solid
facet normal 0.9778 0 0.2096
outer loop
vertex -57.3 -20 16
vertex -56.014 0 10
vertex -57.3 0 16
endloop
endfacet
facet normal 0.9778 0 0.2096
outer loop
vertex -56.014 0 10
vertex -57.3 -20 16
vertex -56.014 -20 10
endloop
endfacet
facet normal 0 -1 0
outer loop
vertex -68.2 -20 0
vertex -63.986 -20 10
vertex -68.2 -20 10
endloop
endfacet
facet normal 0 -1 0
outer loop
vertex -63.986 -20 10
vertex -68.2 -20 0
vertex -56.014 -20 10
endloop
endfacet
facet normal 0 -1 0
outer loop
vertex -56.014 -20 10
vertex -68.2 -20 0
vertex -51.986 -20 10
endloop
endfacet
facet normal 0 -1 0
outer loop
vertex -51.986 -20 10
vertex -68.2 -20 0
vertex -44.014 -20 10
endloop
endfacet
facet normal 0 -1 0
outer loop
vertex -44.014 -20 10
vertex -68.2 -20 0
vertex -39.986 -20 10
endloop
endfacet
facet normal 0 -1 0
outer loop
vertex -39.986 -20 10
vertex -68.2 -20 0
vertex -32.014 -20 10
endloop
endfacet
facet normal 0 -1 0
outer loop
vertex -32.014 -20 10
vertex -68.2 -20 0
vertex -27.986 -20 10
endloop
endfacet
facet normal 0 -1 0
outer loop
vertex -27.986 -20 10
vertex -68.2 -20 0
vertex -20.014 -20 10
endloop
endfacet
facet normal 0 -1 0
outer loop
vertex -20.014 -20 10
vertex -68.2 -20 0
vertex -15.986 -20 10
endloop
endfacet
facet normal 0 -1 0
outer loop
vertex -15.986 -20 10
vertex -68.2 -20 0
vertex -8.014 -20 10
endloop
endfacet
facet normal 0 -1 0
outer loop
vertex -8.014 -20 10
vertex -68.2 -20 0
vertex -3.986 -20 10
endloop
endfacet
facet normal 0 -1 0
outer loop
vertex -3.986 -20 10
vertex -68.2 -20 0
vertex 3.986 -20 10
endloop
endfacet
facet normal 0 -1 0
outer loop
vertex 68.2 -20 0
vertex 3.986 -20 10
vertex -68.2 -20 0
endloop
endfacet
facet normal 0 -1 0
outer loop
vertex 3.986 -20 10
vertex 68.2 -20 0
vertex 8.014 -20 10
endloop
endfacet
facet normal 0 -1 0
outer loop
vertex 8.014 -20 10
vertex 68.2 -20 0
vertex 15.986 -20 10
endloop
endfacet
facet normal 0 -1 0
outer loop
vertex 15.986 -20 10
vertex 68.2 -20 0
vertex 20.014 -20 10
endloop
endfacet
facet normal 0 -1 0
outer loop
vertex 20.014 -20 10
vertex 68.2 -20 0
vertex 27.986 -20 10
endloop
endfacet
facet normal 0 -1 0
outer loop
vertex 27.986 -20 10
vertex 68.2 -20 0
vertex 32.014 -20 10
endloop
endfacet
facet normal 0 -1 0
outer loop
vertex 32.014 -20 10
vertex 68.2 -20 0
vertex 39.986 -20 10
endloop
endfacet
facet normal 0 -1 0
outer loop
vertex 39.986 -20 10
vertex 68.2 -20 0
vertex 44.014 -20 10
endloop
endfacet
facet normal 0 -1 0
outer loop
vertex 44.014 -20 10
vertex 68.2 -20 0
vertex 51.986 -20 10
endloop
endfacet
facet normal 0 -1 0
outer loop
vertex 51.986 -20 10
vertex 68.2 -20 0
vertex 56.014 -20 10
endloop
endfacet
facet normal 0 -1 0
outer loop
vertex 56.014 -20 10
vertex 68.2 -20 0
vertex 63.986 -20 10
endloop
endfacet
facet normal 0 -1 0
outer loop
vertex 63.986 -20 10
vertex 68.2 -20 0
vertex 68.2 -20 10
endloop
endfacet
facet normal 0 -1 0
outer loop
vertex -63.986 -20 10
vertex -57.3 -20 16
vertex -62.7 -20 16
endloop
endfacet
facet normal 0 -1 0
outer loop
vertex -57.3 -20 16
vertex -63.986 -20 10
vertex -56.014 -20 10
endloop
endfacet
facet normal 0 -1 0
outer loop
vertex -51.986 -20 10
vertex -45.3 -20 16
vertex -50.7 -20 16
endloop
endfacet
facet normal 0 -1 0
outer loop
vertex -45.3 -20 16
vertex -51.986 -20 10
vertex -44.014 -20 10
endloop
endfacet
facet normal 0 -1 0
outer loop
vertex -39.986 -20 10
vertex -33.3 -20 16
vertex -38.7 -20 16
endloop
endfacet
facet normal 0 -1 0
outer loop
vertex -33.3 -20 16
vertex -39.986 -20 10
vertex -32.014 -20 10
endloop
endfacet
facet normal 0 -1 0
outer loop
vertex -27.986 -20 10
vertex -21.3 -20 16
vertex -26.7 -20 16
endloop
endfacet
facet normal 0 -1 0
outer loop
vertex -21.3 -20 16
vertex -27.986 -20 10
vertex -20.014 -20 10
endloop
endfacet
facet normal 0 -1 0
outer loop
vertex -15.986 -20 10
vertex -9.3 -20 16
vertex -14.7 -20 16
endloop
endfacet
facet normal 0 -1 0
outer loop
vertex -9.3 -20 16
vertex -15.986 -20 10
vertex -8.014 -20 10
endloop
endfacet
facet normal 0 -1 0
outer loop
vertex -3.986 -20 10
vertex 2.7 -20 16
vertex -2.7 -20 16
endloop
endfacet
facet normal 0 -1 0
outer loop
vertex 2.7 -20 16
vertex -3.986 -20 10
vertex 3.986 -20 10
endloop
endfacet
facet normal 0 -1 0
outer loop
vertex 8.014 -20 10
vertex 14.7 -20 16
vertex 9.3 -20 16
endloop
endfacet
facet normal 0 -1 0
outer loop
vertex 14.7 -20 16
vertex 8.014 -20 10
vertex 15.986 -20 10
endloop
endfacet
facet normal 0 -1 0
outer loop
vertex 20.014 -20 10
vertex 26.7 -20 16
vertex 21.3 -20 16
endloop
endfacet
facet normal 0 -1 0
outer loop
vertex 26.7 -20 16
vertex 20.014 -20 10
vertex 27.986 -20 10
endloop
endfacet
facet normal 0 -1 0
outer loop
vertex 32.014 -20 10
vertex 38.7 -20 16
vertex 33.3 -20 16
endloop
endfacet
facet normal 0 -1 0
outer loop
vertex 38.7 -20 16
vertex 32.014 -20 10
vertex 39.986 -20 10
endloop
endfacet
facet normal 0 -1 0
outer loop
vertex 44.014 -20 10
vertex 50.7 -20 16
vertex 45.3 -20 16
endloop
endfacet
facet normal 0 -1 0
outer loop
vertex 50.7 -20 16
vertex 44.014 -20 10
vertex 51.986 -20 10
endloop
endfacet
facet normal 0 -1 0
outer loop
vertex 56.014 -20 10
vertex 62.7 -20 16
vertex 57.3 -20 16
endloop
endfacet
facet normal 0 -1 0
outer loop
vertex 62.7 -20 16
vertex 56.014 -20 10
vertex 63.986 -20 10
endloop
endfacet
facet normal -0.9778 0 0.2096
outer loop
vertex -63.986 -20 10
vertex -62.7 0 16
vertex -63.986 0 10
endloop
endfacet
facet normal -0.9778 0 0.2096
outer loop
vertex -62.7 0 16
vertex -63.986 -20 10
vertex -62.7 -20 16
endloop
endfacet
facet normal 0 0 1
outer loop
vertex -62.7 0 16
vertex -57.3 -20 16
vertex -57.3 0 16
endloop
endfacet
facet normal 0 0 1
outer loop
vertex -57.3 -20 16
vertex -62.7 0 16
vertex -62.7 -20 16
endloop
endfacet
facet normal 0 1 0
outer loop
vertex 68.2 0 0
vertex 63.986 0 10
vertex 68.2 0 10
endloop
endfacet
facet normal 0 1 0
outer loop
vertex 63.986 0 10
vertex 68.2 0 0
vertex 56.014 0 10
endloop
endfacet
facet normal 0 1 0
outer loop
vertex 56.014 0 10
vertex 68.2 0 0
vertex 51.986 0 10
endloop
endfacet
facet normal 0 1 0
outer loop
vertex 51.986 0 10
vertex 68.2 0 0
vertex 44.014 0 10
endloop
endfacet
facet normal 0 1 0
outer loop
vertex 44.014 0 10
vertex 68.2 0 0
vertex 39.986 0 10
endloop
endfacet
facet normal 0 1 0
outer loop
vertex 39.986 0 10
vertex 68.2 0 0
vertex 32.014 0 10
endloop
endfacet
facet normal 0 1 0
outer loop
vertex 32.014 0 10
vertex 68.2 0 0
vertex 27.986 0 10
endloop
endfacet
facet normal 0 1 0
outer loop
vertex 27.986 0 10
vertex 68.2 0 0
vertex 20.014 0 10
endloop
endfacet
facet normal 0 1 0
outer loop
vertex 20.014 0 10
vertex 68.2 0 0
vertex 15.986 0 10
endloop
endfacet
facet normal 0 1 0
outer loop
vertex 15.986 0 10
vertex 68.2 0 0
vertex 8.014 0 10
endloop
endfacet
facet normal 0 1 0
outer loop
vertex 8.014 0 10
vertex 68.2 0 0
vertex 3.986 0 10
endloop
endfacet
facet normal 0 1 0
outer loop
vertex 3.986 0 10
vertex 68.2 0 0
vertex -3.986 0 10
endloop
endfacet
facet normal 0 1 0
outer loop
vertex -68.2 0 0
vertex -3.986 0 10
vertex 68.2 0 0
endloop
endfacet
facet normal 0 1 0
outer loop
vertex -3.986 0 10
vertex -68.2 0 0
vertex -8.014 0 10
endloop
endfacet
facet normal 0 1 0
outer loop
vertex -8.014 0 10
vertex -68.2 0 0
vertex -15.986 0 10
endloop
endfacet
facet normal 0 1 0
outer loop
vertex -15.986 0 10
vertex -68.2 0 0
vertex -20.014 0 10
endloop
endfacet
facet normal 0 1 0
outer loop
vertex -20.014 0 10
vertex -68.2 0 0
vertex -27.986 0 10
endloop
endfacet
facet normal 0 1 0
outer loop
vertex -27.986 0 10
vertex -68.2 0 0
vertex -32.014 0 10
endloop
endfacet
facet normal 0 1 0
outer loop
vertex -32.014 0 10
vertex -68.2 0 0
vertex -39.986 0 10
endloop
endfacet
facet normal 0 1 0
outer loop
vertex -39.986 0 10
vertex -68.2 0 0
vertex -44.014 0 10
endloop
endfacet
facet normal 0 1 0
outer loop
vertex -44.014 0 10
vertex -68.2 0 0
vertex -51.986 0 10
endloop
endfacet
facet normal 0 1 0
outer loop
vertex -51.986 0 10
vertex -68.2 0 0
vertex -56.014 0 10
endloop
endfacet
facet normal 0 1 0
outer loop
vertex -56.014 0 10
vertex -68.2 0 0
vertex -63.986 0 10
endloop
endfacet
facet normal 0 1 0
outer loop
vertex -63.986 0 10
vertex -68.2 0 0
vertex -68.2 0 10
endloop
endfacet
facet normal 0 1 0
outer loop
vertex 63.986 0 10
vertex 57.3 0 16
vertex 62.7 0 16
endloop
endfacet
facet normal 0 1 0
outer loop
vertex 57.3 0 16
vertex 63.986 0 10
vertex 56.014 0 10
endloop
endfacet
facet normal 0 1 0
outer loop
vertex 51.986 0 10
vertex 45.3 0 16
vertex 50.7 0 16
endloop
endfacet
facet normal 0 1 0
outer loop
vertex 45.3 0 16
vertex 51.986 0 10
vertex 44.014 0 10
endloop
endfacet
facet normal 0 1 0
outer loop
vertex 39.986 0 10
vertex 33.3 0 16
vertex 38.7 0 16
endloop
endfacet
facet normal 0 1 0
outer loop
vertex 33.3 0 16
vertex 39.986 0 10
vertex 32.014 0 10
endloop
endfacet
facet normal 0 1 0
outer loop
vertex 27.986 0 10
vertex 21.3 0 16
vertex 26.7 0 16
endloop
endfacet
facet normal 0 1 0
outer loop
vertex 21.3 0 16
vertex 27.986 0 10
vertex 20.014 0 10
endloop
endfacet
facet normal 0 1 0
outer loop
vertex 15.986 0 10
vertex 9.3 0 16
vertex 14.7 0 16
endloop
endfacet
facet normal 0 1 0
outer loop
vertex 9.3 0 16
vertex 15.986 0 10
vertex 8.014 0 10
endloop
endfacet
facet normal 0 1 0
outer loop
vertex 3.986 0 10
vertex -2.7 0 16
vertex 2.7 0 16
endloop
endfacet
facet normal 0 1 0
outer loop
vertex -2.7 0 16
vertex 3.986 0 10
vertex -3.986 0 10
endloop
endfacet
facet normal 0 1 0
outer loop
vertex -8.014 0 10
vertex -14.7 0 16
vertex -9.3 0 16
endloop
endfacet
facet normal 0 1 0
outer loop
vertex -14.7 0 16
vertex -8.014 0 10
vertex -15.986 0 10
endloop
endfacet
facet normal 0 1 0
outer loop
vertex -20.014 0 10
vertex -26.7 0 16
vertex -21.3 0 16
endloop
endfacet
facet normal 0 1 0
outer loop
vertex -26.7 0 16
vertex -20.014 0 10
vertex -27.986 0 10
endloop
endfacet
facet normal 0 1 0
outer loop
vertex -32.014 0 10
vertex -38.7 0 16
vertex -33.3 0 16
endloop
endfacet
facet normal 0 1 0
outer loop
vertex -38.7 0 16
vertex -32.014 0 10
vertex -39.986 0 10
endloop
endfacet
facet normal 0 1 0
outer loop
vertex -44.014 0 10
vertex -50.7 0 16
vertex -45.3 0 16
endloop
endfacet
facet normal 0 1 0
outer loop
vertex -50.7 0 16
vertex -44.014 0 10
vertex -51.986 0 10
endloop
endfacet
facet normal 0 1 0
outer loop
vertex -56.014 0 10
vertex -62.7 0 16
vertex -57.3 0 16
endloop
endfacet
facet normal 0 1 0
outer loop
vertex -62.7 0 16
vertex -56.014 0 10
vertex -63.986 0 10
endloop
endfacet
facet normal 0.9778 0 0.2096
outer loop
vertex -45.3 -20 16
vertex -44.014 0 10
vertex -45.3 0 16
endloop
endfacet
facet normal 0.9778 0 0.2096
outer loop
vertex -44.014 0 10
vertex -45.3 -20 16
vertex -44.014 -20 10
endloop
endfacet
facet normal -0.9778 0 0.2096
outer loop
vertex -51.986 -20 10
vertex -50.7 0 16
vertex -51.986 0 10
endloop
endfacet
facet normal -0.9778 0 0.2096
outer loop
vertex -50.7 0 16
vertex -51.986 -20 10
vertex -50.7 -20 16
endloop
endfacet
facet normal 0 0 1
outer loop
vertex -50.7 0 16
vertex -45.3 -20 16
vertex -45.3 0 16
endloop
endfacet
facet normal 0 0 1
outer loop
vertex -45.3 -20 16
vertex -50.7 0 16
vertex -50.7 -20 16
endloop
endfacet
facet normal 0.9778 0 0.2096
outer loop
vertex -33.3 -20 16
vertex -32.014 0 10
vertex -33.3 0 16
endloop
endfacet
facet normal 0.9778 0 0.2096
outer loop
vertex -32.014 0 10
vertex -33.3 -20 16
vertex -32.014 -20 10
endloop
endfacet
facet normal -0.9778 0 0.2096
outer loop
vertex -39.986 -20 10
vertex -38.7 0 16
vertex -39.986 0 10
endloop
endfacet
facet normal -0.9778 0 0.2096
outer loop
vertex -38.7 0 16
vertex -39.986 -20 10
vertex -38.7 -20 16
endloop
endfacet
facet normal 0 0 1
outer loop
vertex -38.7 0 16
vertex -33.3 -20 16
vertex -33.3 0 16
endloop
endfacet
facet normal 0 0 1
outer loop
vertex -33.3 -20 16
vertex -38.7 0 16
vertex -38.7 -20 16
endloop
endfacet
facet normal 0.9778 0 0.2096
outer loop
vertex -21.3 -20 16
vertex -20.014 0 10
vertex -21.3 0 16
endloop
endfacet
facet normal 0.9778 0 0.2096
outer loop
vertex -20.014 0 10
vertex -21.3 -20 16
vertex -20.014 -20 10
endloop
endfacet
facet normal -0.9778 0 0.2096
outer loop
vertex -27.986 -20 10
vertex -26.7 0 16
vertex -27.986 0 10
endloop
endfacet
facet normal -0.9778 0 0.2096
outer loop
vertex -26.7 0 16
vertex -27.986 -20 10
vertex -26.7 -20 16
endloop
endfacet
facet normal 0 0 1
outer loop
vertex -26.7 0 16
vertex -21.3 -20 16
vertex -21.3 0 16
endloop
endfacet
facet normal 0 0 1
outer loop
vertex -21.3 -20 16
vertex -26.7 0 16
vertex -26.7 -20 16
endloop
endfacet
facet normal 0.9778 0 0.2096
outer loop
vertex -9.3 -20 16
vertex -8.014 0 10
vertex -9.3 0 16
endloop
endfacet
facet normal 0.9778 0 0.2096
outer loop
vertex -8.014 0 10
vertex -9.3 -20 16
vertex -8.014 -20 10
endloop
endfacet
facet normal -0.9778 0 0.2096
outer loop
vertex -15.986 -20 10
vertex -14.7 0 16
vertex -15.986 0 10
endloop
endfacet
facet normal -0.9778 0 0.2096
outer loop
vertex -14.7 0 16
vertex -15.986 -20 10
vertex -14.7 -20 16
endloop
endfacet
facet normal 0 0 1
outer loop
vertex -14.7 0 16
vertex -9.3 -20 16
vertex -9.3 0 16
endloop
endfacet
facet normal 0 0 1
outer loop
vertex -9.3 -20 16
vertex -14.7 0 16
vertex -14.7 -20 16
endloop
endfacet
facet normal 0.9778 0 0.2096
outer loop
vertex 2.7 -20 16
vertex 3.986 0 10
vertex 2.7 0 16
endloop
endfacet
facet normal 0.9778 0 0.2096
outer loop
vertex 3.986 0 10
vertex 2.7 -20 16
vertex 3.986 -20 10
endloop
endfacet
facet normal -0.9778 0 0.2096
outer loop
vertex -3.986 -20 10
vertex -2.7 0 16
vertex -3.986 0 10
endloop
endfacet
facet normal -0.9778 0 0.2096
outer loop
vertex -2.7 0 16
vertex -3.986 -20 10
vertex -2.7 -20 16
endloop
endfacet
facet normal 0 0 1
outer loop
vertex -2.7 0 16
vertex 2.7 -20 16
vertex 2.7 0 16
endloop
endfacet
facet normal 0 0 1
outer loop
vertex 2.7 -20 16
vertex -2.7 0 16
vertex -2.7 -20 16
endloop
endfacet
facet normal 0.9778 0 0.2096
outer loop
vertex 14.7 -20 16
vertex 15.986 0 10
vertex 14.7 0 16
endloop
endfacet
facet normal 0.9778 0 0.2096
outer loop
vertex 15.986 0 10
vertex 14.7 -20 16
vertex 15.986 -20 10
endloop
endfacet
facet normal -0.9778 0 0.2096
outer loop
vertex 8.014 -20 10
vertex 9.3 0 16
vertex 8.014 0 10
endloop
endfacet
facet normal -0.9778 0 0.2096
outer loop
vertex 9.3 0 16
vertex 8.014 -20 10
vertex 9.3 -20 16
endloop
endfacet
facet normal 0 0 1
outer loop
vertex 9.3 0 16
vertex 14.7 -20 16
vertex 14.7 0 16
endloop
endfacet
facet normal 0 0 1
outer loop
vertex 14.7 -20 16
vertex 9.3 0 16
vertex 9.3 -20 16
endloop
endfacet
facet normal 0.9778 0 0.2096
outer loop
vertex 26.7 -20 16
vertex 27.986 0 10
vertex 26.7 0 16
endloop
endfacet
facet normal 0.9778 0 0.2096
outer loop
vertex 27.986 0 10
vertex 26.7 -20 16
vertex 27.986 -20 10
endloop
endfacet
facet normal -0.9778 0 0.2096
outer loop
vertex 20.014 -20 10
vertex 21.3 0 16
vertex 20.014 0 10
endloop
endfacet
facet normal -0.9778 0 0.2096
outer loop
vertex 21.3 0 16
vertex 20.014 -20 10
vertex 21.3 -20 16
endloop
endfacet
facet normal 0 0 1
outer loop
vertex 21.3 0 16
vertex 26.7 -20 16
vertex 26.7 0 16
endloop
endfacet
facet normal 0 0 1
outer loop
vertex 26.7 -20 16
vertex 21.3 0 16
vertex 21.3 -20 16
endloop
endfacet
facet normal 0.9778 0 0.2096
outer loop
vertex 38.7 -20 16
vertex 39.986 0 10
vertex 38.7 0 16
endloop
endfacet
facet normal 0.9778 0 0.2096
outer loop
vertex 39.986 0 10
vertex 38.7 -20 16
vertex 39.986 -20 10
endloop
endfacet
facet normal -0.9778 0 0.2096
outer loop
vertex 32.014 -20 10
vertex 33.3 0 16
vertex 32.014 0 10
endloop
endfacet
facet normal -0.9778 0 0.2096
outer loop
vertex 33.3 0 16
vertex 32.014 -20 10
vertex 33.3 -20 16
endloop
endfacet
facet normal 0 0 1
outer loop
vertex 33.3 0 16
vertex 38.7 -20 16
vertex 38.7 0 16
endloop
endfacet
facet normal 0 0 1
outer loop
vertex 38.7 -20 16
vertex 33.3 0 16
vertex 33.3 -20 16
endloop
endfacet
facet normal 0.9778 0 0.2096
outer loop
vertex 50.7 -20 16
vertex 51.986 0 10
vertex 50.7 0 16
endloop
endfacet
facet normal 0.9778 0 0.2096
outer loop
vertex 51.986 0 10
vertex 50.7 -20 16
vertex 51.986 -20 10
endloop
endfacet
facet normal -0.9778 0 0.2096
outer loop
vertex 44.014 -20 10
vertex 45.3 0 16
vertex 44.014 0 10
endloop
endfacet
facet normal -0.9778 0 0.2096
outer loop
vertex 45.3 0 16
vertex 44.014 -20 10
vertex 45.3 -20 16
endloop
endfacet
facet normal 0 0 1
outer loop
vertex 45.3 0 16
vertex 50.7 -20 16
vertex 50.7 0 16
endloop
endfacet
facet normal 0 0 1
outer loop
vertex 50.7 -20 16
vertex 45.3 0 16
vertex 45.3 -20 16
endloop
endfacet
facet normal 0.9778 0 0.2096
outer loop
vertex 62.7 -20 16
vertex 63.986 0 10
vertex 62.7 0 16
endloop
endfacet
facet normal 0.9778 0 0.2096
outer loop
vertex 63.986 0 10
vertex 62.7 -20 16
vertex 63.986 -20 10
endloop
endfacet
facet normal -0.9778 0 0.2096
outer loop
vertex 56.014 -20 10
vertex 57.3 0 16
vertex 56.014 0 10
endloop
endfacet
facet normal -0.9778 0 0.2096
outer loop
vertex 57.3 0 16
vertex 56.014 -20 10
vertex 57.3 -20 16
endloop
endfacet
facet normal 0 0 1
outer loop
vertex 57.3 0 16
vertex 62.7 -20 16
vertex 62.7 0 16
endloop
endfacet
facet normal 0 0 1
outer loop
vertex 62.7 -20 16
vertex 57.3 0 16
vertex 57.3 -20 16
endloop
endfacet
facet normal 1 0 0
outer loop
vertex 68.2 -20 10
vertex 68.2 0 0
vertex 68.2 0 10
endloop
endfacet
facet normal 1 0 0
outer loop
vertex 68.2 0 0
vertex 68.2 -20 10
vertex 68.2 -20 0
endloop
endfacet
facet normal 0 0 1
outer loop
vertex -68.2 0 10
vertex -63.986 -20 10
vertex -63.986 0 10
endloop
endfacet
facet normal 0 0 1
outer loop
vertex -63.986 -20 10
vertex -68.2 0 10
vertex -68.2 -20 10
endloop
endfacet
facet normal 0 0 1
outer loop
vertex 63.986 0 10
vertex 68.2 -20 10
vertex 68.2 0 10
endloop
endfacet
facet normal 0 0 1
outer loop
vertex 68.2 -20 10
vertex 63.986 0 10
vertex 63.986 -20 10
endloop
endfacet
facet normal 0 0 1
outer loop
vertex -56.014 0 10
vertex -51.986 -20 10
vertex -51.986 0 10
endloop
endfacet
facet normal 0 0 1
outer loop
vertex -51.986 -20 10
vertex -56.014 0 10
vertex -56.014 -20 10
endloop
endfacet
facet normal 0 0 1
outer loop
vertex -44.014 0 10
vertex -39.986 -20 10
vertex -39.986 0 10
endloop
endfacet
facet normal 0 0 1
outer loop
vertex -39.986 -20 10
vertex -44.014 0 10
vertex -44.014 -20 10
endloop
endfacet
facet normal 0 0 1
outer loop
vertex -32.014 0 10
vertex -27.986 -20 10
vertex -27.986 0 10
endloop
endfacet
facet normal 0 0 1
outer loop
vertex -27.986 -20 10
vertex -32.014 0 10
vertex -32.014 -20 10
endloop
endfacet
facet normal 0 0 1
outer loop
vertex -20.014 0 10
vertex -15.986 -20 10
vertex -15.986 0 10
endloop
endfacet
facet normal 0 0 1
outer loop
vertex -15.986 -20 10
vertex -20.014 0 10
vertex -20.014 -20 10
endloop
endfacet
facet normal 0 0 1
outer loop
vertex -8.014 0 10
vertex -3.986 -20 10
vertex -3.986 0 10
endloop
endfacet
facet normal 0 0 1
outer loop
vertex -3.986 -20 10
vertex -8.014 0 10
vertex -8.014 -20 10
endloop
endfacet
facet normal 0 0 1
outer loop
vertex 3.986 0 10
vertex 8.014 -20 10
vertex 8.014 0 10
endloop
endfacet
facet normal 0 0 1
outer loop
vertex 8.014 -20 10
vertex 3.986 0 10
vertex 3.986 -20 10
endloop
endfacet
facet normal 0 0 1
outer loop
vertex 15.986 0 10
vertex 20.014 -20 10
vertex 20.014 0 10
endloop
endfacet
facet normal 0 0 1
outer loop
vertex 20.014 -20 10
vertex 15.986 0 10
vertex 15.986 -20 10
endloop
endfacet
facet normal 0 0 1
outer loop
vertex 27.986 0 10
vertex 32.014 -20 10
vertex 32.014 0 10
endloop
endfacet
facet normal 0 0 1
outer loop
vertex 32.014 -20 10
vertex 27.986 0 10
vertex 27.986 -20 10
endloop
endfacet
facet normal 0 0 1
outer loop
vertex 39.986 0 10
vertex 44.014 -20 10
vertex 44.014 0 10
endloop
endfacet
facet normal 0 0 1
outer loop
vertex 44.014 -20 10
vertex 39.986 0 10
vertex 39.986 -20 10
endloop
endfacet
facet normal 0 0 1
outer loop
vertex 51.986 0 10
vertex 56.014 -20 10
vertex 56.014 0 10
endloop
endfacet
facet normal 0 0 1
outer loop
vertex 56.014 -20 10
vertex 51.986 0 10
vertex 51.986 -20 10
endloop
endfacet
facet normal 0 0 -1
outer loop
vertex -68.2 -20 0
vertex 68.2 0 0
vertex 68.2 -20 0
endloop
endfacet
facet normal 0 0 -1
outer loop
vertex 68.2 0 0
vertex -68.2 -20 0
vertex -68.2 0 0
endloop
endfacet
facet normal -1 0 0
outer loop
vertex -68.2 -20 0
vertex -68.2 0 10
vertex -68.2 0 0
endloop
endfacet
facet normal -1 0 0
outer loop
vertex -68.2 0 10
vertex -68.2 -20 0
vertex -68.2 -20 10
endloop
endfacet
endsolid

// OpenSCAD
$fn = 32;

// ----------------------------------------------------------------------
// Toothed rack, 11 teeth
// 12 mm pitch, 6 mm teeth
// ----------------------------------------------------------------------

// --- parameters (mm) ---
bar_w = 20;     // bar width (Y)
bar_h = 10;     // bar height (Z)
teeth = 11;     // number of teeth
pitch = 12;     // tooth pitch
tooth_h = 6;    // tooth height above the bar
root_w = 8.4;   // tooth width at the root
crest_w = 5.4;  // tooth width at the crest

// --- derived feature positions (mm) ---
span = (teeth - 1) * pitch;  // = 120   distance between the outer teeth
bar_l = span + root_w + 8;   // = 136.4   bar length: teeth plus 4 mm at each end
tooth_x = -span / 2;         // = -60   X of the first tooth
height = bar_h + tooth_h;    // = 16   overall height
feature_centers = [
  [tooth_x + 0 * pitch, -bar_w / 2],
  [tooth_x + 1 * pitch, -bar_w / 2],
  [tooth_x + 2 * pitch, -bar_w / 2],
  [tooth_x + 3 * pitch, -bar_w / 2],
  [tooth_x + 4 * pitch, -bar_w / 2],
  [tooth_x + 5 * pitch, -bar_w / 2],
  [tooth_x + 6 * pitch, -bar_w / 2],
  [tooth_x + 7 * pitch, -bar_w / 2],
  [tooth_x + 8 * pitch, -bar_w / 2],
  [tooth_x + 9 * pitch, -bar_w / 2],
  [tooth_x + 10 * pitch, -bar_w / 2]
];   // tooth centre line, drives the tooth loop

// bar with a rack of teeth, one extruded trapezoium per centre
module rack_tooth() {
  linear_extrude(height = bar_w)
    polygon(points = [
      [0, 0],
      [root_w, 0],
      [root_w / 2 + crest_w / 2, tooth_h + 1],
      [root_w / 2 - crest_w / 2, tooth_h + 1]
    ]);
}

union() {
  translate([-bar_l / 2, -bar_w, 0]) cube([bar_l, bar_w, bar_h]);
  for (centre = feature_centers)
    translate([centre[0] - root_w / 2, 0, bar_h - 1]) rotate([90, 0, 0]) rack_tooth();
}
